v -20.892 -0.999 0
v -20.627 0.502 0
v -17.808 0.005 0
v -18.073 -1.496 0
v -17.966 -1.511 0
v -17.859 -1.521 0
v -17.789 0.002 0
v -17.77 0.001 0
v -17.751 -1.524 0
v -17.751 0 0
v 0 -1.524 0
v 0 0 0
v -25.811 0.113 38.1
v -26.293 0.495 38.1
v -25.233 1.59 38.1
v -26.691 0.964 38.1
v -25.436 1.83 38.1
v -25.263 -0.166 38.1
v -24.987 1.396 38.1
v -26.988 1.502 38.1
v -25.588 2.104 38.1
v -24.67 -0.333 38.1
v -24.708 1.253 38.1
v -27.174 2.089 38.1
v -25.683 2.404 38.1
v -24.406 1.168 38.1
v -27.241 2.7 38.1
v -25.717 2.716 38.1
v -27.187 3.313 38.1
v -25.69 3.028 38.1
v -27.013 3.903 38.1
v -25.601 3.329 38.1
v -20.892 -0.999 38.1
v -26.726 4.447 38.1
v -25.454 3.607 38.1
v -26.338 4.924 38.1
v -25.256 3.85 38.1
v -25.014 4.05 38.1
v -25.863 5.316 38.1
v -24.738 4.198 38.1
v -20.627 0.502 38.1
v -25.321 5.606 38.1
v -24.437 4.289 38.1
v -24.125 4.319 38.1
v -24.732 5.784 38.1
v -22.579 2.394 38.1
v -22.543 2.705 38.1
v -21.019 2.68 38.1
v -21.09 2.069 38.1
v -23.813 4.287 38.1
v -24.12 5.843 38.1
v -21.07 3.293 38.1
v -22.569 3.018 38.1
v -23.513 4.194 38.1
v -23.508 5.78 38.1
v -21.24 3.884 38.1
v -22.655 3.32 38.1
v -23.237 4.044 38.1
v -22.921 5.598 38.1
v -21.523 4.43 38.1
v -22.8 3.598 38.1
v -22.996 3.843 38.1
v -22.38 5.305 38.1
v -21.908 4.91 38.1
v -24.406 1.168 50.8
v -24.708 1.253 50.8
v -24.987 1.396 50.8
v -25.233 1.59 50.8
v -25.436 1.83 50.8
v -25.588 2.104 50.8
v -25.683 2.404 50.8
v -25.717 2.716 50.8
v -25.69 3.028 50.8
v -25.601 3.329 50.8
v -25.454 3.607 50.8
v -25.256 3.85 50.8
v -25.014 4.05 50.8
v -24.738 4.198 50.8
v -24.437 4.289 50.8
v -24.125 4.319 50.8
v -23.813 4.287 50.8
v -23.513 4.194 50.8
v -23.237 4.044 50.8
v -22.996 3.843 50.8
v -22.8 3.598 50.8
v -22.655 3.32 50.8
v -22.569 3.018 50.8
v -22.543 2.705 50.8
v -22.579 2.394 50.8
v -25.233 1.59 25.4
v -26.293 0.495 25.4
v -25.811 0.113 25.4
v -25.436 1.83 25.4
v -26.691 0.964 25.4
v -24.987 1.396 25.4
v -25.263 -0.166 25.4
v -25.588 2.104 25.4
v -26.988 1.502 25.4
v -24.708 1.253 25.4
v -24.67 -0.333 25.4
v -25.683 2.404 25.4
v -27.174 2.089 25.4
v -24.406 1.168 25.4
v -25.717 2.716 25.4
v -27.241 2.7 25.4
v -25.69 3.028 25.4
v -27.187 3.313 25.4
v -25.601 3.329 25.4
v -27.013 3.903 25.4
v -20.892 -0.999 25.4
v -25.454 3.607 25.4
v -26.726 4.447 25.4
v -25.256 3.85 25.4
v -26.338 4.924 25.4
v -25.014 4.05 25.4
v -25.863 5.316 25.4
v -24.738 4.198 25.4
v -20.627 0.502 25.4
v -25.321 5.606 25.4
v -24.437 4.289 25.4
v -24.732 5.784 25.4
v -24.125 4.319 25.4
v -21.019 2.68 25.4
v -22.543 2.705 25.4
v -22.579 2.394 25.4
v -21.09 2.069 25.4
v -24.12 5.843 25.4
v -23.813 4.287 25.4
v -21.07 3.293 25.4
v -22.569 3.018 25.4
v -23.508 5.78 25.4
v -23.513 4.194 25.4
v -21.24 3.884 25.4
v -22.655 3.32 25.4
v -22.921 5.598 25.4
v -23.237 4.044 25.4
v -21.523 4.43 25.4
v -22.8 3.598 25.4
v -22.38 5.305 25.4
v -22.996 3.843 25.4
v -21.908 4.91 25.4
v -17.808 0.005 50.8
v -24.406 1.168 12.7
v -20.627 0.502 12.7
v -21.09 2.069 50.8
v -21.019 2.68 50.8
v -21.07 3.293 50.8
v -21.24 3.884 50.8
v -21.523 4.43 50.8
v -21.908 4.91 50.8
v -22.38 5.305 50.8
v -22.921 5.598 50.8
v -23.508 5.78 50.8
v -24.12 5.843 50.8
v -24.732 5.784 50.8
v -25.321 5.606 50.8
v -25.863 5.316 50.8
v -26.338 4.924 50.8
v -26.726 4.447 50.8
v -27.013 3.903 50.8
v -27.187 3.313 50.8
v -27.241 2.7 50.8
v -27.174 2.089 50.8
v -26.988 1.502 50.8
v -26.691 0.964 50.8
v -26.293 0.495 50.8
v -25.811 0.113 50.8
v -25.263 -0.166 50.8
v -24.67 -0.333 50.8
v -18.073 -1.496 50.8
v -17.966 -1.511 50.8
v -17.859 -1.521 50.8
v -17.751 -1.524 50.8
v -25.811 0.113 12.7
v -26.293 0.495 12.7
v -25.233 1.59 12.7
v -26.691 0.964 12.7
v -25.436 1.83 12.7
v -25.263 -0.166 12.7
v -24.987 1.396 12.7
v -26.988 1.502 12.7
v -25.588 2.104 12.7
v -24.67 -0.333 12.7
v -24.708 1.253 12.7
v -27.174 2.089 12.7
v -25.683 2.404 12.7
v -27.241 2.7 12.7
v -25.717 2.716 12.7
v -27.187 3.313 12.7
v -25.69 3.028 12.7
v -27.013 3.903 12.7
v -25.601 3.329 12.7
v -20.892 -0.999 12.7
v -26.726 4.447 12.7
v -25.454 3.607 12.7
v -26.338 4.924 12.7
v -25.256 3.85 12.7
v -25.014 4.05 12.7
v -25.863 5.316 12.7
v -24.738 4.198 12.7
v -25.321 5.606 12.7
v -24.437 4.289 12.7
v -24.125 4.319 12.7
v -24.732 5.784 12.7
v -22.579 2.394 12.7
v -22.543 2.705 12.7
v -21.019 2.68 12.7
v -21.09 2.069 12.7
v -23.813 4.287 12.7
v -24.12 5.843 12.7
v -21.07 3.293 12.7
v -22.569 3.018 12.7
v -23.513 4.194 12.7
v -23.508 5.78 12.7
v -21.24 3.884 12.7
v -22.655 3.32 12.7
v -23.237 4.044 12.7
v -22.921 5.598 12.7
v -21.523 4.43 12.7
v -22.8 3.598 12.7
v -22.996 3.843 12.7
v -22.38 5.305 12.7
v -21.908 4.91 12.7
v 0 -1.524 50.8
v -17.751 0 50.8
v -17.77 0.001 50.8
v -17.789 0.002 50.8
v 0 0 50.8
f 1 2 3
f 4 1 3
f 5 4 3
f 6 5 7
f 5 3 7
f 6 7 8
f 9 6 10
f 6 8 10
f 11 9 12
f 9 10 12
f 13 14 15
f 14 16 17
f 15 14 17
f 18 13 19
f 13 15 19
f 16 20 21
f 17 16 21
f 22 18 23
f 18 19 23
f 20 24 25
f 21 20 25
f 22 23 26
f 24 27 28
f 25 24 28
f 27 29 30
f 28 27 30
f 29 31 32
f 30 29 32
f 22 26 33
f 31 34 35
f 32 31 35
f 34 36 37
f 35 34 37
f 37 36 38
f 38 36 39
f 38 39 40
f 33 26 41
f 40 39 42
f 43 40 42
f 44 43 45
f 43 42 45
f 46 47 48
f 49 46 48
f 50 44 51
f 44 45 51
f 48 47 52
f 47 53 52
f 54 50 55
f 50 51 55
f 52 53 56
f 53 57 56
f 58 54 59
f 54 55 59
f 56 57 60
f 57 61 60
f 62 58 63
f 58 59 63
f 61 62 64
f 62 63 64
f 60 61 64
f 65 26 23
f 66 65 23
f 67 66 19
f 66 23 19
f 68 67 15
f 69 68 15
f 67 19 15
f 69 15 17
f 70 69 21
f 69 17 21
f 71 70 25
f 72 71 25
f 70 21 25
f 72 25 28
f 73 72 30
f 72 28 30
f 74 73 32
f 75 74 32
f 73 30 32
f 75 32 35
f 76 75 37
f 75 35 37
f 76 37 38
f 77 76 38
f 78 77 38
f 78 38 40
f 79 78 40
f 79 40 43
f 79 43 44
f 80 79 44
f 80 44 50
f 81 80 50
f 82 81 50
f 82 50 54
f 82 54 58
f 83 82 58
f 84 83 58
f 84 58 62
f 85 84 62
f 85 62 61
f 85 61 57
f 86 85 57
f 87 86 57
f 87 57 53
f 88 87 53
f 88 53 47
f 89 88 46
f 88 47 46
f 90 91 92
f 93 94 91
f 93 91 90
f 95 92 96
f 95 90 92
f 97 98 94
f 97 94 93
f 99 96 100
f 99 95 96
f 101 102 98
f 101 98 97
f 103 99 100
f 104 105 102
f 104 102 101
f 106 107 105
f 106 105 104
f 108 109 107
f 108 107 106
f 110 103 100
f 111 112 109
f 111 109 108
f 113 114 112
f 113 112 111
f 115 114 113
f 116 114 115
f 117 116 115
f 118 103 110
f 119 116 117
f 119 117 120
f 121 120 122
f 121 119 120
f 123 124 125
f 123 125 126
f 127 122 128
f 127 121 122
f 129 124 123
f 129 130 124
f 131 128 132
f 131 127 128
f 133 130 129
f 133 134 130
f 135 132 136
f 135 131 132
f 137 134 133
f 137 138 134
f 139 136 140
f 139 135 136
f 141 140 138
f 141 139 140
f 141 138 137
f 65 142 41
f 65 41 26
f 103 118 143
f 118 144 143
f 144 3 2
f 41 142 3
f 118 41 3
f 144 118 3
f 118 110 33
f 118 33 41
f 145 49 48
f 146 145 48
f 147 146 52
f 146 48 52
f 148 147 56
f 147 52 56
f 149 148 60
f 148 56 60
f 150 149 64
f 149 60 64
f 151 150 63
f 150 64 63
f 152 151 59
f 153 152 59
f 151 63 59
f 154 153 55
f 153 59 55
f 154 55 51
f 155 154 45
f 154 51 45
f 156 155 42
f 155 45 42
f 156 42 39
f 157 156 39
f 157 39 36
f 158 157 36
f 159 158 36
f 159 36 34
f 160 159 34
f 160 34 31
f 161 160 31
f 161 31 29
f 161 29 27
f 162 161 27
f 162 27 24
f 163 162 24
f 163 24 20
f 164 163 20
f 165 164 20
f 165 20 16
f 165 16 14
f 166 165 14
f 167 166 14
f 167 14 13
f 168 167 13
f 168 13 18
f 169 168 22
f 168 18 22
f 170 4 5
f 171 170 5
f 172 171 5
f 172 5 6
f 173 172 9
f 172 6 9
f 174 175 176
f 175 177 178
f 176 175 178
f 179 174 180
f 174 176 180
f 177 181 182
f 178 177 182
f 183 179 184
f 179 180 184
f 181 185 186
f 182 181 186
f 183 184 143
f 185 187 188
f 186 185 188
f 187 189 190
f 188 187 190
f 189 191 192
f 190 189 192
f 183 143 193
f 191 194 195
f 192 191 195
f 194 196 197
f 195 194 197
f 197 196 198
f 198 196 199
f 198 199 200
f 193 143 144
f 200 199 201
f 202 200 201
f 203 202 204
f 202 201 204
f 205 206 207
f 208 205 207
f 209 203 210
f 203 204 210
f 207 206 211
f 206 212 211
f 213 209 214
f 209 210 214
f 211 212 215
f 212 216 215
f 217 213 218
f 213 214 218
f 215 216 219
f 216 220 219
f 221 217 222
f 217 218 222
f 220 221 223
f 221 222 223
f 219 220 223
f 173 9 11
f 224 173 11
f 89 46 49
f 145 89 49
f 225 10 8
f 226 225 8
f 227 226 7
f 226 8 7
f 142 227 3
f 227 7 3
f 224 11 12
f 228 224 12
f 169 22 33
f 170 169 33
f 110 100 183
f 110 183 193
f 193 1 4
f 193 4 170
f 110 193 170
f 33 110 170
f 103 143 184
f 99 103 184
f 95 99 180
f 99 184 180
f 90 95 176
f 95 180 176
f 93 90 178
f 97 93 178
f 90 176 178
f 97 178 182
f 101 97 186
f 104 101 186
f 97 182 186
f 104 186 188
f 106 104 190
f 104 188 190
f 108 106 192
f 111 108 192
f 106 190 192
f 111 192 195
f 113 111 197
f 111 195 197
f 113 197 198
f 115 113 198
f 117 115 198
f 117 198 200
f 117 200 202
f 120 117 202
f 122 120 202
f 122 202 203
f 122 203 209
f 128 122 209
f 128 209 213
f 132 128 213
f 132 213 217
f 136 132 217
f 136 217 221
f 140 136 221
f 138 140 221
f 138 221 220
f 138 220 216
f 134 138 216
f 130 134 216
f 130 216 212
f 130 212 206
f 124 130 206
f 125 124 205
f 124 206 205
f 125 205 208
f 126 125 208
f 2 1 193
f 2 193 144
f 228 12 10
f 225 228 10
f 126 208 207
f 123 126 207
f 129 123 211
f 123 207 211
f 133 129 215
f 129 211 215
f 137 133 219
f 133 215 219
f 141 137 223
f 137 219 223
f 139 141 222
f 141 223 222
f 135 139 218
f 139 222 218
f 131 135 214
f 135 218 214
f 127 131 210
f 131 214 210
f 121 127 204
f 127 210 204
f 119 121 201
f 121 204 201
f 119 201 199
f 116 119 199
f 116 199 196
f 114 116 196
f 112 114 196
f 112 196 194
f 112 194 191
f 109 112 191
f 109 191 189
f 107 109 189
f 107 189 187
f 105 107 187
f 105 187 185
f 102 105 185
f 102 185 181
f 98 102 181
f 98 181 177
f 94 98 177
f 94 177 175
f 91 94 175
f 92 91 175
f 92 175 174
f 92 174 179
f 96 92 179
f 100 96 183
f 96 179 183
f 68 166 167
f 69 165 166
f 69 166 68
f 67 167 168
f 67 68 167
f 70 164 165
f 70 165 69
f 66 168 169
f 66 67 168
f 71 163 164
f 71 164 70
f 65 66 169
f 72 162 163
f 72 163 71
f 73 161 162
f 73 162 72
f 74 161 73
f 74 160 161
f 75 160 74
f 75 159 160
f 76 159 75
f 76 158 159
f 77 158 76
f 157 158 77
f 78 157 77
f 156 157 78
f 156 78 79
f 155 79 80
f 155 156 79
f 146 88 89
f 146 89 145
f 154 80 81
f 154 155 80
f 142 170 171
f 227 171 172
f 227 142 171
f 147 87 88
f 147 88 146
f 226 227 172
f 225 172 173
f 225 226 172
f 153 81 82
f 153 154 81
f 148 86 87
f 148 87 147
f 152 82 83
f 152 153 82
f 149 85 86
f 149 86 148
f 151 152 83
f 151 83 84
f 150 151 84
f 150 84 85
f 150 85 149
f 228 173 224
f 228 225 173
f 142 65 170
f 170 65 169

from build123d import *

# Parameters (mm, degrees)
BRIDA_BASE1_DEPTH     = 50.8
CORTAR_EXTRUIR1_START = 25.4
CORTAR_EXTRUIR1_DEPTH = 12.7
MATRIZL1_COUNT        = 2
MATRIZL1_PITCH        = 25.4


# Read off the part's stored shape, not the designer's step: Cortar-Extruir1
# Sheet-metal steps are written as plain solids
with BuildPart() as part:
    # Croquis1 → Brida base1 (new body)
    with BuildSketch(Plane.XY):
        with BuildLine():
            Line((0, 0), (-17.751111243, 0))
            ThreePointArc((-17.751111243, 0), (-17.77989007, 0.001256511), (-17.808449872, 0.00501648))
            Line((-17.808449872, 0.00501648), (-24.405666482, 1.168283766))
            ThreePointArc((-24.405666482, 1.168283766), (-25.014357108, 4.05002443), (-22.578895558, 2.393684921))
            Line((-22.578895558, 2.393684921), (-21.089835293, 2.069223014))
            ThreePointArc((-21.089835293, 2.069223014), (-25.863339932, 5.315648452), (-24.670306305, -0.33256325))
            Line((-24.670306305, -0.33256325), (-18.073089694, -1.495830536))
            ThreePointArc((-18.073089694, -1.495830536), (-17.912715421, -1.516944209), (-17.751111243, -1.524))
            Line((-17.751111243, -1.524), (0, -1.524))
            Line((0, -1.524), (0, 0))
        make_face()
    extrude(amount=BRIDA_BASE1_DEPTH)

    # Cortar-Extruir1 outline → Cortar-Extruir1 (cut)
    with BuildSketch(Plane.XY.offset(CORTAR_EXTRUIR1_START)):
        with BuildLine():
            Line((-24.670306305, -0.33256325), (-20.8915, -0.998868756))
            Line((-20.8915, -0.998868756), (-20.626860177, 0.50197826))
            Line((-20.626860177, 0.50197826), (-24.405666482, 1.168283766))
            ThreePointArc((-24.405666482, 1.168283766), (-25.014357108, 4.05002443), (-22.578895558, 2.393684921))
            Line((-22.578895558, 2.393684921), (-21.089835293, 2.069223014))
            ThreePointArc((-21.089835293, 2.069223014), (-25.863339932, 5.315648452), (-24.670306305, -0.33256325))
        make_face()
    cortar_extruir1 = extrude(amount=CORTAR_EXTRUIR1_DEPTH, mode=Mode.SUBTRACT)

    # MatrizL1: Cortar-Extruir1 ×2
    with Locations(*[(0, 0, -i * MATRIZL1_PITCH) for i in range(1, MATRIZL1_COUNT)]):
        add(cortar_extruir1, mode=Mode.SUBTRACT)


solid = part.part
